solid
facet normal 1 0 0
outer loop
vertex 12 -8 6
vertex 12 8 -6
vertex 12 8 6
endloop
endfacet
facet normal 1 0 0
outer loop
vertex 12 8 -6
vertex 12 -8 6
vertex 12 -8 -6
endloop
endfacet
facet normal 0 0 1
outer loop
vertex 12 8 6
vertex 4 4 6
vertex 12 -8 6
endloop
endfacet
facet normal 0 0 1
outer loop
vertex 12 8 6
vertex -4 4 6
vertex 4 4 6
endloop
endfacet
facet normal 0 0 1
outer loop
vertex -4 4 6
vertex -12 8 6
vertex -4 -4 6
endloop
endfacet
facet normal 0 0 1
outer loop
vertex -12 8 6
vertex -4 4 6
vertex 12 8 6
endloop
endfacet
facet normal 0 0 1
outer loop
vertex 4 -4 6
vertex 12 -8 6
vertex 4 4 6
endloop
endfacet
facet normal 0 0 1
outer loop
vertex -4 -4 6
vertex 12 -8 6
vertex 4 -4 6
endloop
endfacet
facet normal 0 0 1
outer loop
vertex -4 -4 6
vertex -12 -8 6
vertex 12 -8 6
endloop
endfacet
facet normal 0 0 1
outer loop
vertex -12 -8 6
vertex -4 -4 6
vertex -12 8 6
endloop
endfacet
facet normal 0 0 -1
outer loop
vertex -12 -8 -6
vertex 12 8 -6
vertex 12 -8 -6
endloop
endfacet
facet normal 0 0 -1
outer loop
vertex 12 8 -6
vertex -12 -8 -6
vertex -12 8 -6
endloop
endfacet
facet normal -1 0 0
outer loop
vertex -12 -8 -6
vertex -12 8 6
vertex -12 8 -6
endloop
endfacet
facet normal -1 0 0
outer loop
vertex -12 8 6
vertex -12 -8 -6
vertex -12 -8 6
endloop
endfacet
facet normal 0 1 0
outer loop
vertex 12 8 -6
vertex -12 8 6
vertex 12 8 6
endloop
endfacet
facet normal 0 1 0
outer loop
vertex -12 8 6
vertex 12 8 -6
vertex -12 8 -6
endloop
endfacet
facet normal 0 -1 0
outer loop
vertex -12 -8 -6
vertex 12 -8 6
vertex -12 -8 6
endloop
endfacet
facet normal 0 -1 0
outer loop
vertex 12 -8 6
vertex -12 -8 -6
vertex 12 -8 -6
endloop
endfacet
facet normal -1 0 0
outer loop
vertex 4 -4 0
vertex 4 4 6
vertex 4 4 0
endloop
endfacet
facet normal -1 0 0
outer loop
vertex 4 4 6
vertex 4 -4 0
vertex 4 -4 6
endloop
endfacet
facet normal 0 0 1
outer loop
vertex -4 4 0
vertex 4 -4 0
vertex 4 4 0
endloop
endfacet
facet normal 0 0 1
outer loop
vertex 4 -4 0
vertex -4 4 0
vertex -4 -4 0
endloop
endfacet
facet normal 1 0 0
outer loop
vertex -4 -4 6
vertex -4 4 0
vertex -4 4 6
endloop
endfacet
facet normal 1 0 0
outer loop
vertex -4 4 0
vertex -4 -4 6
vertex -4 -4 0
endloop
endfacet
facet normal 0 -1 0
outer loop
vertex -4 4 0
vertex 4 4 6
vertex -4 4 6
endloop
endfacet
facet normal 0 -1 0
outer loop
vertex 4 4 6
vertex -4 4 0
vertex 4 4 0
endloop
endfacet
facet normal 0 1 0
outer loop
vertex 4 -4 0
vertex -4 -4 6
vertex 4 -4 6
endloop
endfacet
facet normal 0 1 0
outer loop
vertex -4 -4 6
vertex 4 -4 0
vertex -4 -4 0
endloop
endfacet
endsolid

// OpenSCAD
// Auto-generated from tests/data/feature_fixtures_manifest.json
// fixture: box_with_top_notch
// fixture_type: box
// description: Box with a rectangular notch cut from the top face. Documents that the conservative bounding-plane detector still classifies this as box_like_solid because the six outer boundary planes remain intact; interior cutouts are invisible to the current algorithm.
$fn = 96;

box_size = [24.000000, 16.000000, 12.000000];
box_origin = [-12.000000, -8.000000, -6.000000];

module through_hole_x(center, diameter, length) {
  translate([box_origin[0] - 0.1, center[1], center[2]])
    rotate(a=90, v=[0, 1, 0]) cylinder(d=diameter, h=length, center=false);
}

module through_hole_y(center, diameter, length) {
  translate([center[0], box_origin[1] - 0.1, center[2]])
    rotate(a=90, v=[-1, 0, 0]) cylinder(d=diameter, h=length, center=false);
}

module through_hole_z(center, diameter, length) {
  translate([center[0], center[1], box_origin[2] - 0.1])
    cylinder(d=diameter, h=length, center=false);
}

difference() {
  translate(box_origin) cube(box_size);
  translate([-4.000000, -4.000000, 0.000000]) cube([8.000000, 8.000000, 6.000000]);  // cutout_0
}
